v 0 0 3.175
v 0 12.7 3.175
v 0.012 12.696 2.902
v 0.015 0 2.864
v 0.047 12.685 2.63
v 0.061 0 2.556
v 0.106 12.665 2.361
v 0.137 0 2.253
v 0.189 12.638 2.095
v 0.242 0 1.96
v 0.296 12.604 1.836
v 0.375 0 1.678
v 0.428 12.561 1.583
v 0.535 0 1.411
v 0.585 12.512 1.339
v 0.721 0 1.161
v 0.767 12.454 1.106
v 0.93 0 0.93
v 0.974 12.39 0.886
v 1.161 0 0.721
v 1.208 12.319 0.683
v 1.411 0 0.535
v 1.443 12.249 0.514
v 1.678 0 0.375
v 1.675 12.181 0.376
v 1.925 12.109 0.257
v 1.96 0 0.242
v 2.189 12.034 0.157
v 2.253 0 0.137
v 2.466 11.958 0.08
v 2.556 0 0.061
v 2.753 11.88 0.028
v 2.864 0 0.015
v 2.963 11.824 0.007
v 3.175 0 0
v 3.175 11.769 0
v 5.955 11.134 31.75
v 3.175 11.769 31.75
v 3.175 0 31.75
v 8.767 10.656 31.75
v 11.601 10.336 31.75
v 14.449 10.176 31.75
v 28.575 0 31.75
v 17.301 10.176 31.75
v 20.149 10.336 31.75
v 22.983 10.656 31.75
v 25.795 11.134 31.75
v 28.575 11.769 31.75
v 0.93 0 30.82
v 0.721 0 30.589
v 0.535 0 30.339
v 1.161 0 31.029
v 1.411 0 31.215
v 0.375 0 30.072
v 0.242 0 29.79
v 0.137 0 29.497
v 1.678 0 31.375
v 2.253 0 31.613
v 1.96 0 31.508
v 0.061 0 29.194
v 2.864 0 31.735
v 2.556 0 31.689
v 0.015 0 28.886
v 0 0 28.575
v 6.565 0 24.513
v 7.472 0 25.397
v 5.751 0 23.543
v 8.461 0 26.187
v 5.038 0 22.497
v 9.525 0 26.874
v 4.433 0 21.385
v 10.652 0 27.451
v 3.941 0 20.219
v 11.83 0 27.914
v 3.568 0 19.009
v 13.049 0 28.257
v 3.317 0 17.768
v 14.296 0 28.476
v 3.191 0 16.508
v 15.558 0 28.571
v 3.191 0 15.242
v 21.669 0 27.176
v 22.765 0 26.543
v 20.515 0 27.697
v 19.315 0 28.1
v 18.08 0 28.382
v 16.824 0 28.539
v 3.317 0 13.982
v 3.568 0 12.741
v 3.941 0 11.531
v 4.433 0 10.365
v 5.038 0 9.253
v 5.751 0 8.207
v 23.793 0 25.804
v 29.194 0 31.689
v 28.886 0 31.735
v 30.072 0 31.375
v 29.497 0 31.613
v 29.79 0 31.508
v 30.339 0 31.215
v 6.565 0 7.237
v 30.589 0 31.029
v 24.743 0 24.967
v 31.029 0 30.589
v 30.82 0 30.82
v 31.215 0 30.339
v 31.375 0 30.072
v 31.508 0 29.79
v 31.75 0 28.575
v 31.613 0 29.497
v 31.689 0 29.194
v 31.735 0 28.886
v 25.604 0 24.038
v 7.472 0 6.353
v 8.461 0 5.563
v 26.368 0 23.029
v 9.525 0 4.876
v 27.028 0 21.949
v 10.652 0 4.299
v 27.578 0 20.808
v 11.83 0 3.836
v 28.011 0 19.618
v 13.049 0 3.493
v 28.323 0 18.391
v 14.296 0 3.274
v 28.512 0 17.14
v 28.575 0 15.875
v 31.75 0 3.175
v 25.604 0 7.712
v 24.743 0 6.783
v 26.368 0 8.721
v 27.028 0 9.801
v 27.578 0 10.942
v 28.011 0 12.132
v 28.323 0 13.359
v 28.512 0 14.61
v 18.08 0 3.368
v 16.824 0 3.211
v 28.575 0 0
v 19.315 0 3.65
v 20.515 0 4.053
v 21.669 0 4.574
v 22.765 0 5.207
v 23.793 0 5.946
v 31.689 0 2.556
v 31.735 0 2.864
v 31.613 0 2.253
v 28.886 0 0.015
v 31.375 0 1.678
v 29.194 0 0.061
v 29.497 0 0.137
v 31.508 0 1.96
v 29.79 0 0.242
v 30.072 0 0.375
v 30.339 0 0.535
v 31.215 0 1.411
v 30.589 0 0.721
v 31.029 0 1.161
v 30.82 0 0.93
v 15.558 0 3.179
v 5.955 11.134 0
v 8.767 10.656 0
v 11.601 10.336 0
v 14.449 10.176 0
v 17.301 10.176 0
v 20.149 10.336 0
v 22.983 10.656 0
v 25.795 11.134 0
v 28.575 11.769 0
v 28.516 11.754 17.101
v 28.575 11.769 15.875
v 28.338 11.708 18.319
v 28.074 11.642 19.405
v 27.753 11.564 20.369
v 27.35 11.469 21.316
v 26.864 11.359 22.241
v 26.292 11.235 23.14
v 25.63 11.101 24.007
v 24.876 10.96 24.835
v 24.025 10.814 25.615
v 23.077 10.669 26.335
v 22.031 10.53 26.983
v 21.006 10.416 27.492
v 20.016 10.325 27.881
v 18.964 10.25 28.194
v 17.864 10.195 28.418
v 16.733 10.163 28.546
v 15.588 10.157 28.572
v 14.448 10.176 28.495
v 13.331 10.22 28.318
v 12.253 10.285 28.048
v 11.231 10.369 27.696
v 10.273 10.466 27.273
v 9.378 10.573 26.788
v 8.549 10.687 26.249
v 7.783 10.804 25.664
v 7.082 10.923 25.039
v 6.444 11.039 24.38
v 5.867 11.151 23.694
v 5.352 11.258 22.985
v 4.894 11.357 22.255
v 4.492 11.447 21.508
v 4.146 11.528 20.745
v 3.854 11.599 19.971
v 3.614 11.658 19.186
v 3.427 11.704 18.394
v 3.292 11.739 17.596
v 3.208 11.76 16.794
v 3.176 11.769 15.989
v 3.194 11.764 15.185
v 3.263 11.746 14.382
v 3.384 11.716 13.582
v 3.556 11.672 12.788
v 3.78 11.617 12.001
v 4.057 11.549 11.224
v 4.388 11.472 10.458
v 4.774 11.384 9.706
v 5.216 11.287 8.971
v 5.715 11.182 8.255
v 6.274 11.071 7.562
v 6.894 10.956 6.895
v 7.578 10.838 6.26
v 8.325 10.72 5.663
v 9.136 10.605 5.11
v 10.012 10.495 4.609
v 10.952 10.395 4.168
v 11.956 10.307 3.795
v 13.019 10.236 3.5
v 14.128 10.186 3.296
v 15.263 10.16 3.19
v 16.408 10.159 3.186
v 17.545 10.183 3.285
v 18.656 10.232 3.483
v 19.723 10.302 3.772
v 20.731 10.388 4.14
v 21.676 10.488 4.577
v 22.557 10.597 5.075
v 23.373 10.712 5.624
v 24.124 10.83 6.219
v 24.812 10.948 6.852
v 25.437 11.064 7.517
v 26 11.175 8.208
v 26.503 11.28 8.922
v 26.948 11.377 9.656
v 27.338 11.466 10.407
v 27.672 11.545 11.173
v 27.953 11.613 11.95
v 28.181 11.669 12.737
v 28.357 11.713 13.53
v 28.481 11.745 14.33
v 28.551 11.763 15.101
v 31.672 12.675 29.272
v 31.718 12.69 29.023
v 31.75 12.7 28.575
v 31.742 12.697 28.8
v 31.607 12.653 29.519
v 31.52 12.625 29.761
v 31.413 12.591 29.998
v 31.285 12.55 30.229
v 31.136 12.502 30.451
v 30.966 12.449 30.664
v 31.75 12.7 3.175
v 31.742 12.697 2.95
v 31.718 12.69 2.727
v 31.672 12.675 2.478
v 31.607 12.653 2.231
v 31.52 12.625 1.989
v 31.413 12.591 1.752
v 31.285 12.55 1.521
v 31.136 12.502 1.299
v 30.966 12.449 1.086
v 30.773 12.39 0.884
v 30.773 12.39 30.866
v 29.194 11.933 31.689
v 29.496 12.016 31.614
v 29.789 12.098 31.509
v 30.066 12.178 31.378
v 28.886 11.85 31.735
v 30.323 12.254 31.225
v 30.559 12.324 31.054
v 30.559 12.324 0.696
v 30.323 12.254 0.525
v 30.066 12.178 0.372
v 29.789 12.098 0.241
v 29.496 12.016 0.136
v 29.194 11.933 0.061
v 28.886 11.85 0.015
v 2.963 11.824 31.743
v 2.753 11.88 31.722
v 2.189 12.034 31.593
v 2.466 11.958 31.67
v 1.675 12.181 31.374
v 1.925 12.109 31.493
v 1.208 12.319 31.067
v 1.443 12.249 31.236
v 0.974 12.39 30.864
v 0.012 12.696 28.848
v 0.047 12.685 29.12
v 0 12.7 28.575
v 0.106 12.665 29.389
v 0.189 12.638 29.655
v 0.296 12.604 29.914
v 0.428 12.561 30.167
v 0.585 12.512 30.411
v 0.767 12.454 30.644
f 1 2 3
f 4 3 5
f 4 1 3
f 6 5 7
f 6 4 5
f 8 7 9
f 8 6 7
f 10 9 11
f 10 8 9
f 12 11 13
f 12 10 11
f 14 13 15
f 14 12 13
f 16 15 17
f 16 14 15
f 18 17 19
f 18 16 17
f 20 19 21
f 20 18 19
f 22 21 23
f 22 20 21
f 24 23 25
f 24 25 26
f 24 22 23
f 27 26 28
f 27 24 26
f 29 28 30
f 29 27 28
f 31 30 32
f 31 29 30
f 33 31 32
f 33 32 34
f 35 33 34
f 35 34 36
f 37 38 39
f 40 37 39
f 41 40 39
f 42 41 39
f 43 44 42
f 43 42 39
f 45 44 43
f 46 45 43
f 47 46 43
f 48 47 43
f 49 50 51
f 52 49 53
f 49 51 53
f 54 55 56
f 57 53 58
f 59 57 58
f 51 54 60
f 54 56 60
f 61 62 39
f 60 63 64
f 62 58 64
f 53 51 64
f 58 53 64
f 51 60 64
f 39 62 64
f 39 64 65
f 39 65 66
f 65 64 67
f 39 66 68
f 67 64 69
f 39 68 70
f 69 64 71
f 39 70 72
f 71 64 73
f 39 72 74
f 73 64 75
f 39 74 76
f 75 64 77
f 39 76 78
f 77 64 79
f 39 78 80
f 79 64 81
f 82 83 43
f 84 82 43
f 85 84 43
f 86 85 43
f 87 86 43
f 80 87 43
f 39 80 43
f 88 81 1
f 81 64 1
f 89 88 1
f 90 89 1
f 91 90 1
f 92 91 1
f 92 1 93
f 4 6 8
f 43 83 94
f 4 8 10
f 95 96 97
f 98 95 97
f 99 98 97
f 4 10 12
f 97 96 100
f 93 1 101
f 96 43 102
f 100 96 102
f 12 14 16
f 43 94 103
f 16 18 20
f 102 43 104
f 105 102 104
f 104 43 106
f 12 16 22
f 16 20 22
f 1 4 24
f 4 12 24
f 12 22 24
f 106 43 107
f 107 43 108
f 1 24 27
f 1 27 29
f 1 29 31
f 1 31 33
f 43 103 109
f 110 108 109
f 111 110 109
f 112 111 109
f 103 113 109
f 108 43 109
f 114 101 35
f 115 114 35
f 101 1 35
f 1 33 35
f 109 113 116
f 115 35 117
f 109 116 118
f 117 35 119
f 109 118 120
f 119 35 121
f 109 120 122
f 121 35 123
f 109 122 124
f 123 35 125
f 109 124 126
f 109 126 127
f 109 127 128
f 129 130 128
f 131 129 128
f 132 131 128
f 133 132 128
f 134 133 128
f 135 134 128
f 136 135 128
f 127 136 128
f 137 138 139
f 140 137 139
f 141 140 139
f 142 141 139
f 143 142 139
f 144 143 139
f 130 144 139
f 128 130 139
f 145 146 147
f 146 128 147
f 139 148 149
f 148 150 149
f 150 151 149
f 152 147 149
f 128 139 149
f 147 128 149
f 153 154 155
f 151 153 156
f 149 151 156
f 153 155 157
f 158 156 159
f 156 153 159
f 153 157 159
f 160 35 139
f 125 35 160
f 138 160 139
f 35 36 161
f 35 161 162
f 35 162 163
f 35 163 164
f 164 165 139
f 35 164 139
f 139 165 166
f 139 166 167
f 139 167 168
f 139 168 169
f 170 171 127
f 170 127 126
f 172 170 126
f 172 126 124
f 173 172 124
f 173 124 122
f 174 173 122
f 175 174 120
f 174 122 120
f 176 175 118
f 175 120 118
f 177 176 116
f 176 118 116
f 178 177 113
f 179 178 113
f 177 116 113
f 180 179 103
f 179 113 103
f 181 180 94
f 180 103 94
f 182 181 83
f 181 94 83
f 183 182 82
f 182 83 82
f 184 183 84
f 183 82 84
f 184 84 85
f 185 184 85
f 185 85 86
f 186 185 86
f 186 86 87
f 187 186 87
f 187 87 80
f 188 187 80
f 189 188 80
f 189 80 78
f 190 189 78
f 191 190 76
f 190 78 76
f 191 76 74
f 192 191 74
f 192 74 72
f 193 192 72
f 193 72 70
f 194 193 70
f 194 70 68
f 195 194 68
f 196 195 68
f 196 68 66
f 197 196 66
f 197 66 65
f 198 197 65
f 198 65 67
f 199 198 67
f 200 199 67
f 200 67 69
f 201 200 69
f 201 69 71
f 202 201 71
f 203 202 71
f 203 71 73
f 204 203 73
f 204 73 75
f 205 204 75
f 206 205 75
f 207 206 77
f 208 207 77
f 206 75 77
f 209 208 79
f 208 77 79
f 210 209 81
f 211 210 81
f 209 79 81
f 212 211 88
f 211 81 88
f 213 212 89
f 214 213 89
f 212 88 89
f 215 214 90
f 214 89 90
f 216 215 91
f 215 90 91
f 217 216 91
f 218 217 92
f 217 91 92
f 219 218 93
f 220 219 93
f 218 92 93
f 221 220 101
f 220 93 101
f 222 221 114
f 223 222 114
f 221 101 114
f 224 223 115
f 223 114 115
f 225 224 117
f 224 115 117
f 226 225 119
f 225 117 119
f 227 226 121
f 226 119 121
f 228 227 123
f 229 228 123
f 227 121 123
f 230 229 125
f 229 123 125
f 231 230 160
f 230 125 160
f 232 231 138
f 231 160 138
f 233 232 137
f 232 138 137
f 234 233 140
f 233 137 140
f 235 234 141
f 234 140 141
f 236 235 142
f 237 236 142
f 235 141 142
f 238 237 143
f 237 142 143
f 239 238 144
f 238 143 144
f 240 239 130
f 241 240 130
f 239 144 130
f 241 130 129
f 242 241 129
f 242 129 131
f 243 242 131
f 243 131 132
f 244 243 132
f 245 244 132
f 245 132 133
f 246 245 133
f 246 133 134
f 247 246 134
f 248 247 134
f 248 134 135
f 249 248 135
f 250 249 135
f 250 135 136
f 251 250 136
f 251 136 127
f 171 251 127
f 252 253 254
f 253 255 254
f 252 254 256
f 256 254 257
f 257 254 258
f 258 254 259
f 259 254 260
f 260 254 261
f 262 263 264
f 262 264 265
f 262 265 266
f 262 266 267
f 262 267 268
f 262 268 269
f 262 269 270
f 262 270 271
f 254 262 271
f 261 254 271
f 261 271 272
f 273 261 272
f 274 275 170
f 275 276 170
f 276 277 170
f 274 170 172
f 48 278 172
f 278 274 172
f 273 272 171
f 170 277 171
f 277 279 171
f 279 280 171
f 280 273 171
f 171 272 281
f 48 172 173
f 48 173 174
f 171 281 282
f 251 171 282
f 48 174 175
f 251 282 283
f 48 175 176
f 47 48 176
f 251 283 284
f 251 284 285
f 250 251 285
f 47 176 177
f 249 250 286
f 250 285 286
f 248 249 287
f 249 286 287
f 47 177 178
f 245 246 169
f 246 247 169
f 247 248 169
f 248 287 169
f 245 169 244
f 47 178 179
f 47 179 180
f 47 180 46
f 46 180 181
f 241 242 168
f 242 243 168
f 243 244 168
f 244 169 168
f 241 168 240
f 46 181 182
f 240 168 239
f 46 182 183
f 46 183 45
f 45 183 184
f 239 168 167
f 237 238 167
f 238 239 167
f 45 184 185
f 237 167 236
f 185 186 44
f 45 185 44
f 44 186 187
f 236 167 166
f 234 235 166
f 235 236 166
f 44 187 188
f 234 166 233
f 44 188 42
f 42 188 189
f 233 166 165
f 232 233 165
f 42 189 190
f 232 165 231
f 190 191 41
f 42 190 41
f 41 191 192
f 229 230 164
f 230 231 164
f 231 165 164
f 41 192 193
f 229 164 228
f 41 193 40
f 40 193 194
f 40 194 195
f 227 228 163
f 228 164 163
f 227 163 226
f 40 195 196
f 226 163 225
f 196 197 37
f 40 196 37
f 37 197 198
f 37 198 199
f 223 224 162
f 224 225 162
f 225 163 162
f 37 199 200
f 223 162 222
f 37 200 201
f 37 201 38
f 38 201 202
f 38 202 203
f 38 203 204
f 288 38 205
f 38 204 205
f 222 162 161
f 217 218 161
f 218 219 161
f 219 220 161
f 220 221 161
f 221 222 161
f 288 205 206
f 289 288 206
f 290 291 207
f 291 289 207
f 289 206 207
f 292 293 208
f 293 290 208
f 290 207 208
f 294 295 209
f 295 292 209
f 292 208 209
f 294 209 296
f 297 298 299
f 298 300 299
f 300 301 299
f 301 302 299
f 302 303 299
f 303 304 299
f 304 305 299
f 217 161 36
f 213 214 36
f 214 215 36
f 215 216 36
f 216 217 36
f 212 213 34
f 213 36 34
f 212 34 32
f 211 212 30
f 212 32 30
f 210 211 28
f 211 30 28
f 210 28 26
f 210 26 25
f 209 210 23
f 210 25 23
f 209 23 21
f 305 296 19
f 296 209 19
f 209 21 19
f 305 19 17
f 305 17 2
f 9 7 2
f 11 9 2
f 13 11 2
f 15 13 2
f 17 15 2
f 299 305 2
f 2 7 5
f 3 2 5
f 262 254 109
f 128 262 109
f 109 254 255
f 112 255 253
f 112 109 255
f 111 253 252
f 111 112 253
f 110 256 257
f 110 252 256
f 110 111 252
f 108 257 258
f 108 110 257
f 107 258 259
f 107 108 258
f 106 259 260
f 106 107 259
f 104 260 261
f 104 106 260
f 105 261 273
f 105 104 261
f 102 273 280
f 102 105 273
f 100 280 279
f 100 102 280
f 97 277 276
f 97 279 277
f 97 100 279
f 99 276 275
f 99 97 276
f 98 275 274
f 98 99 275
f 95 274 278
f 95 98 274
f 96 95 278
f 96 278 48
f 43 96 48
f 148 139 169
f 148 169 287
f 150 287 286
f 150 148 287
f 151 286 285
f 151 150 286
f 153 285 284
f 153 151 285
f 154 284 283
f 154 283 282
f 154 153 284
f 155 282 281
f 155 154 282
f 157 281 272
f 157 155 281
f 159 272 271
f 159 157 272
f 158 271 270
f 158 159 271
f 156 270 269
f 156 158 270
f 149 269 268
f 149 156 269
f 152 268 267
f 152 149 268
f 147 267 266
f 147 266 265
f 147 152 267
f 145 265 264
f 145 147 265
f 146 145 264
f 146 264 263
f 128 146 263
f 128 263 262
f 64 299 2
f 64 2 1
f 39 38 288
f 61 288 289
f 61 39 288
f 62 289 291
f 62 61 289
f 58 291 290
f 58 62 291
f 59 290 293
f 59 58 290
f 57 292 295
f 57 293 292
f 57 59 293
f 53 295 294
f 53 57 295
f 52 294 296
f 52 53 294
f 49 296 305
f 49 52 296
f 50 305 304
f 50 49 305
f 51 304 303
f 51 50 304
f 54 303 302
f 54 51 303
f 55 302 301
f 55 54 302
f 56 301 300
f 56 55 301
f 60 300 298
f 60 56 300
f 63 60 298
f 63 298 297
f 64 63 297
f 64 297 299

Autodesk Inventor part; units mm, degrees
ref_plane "YZ Plane" through (0, 0, 0) normal (1, 0, 0) x (0, 1, 0)
ref_plane "XZ Plane" through (0, 0, 0) normal (0, 1, 0) x (-1, 0, 0)
ref_plane "XY Plane" through (0, 0, 0) normal (0, 0, 1) x (1, 0, 0)
sketch "Sketch1" plane through (0, 0, 0) normal (0, 0, 1) x (1, 0, 0)
  line L0 (0, 0) -> (31.75, 0)
  arc A0 (0, 12.7) -> (31.75, 12.7) centre (15.875, 60.9558) ccw
  line L1 (0, 12.7) -> (0, 0)
  line L2 (31.75, 12.7) -> (31.75, 0)
  dimension "d0" = 50.8
  dimension "d1" = 31.75
  dimension "d2" = 12.7
extrude "Extrusion1" add sketch "Sketch1" along normal blind 31.75
sketch "Sketch2" plane through (0, 0, 0) normal (0, -1, 0) x (1, 0, 0)
  line L0 (31.75, 0) -> (31.75, 31.75) projected
  circle A0 centre (15.875, 15.875) radius 12.7
  line L1 (0, 0) -> (31.75, 0) projected
  line L2 (15.875, 15.875) -> (0, 15.875) construction
  line L3 (0, 0) -> (0, 31.75) construction
  line L4 (15.875, 15.875) -> (31.75, 15.875) construction
  line L5 (15.875, 15.875) -> (15.875, 31.75) construction
  line L6 (15.875, 15.875) -> (15.875, 0) construction
  line L7 (0, 31.75) -> (31.75, 31.75) construction
  dimension "d5" = 25.4
extrude "Extrusion2" cut sketch "Sketch2" against normal through all
fillet "Fillet1" radius 3.175 4 edges at (31.75, 6.35, 31.75) (0, 6.35, 31.75) (31.75, 6.35, 0) (0, 6.35, 0)
properties part number "CoilHolder" material "ABS Plastic"
